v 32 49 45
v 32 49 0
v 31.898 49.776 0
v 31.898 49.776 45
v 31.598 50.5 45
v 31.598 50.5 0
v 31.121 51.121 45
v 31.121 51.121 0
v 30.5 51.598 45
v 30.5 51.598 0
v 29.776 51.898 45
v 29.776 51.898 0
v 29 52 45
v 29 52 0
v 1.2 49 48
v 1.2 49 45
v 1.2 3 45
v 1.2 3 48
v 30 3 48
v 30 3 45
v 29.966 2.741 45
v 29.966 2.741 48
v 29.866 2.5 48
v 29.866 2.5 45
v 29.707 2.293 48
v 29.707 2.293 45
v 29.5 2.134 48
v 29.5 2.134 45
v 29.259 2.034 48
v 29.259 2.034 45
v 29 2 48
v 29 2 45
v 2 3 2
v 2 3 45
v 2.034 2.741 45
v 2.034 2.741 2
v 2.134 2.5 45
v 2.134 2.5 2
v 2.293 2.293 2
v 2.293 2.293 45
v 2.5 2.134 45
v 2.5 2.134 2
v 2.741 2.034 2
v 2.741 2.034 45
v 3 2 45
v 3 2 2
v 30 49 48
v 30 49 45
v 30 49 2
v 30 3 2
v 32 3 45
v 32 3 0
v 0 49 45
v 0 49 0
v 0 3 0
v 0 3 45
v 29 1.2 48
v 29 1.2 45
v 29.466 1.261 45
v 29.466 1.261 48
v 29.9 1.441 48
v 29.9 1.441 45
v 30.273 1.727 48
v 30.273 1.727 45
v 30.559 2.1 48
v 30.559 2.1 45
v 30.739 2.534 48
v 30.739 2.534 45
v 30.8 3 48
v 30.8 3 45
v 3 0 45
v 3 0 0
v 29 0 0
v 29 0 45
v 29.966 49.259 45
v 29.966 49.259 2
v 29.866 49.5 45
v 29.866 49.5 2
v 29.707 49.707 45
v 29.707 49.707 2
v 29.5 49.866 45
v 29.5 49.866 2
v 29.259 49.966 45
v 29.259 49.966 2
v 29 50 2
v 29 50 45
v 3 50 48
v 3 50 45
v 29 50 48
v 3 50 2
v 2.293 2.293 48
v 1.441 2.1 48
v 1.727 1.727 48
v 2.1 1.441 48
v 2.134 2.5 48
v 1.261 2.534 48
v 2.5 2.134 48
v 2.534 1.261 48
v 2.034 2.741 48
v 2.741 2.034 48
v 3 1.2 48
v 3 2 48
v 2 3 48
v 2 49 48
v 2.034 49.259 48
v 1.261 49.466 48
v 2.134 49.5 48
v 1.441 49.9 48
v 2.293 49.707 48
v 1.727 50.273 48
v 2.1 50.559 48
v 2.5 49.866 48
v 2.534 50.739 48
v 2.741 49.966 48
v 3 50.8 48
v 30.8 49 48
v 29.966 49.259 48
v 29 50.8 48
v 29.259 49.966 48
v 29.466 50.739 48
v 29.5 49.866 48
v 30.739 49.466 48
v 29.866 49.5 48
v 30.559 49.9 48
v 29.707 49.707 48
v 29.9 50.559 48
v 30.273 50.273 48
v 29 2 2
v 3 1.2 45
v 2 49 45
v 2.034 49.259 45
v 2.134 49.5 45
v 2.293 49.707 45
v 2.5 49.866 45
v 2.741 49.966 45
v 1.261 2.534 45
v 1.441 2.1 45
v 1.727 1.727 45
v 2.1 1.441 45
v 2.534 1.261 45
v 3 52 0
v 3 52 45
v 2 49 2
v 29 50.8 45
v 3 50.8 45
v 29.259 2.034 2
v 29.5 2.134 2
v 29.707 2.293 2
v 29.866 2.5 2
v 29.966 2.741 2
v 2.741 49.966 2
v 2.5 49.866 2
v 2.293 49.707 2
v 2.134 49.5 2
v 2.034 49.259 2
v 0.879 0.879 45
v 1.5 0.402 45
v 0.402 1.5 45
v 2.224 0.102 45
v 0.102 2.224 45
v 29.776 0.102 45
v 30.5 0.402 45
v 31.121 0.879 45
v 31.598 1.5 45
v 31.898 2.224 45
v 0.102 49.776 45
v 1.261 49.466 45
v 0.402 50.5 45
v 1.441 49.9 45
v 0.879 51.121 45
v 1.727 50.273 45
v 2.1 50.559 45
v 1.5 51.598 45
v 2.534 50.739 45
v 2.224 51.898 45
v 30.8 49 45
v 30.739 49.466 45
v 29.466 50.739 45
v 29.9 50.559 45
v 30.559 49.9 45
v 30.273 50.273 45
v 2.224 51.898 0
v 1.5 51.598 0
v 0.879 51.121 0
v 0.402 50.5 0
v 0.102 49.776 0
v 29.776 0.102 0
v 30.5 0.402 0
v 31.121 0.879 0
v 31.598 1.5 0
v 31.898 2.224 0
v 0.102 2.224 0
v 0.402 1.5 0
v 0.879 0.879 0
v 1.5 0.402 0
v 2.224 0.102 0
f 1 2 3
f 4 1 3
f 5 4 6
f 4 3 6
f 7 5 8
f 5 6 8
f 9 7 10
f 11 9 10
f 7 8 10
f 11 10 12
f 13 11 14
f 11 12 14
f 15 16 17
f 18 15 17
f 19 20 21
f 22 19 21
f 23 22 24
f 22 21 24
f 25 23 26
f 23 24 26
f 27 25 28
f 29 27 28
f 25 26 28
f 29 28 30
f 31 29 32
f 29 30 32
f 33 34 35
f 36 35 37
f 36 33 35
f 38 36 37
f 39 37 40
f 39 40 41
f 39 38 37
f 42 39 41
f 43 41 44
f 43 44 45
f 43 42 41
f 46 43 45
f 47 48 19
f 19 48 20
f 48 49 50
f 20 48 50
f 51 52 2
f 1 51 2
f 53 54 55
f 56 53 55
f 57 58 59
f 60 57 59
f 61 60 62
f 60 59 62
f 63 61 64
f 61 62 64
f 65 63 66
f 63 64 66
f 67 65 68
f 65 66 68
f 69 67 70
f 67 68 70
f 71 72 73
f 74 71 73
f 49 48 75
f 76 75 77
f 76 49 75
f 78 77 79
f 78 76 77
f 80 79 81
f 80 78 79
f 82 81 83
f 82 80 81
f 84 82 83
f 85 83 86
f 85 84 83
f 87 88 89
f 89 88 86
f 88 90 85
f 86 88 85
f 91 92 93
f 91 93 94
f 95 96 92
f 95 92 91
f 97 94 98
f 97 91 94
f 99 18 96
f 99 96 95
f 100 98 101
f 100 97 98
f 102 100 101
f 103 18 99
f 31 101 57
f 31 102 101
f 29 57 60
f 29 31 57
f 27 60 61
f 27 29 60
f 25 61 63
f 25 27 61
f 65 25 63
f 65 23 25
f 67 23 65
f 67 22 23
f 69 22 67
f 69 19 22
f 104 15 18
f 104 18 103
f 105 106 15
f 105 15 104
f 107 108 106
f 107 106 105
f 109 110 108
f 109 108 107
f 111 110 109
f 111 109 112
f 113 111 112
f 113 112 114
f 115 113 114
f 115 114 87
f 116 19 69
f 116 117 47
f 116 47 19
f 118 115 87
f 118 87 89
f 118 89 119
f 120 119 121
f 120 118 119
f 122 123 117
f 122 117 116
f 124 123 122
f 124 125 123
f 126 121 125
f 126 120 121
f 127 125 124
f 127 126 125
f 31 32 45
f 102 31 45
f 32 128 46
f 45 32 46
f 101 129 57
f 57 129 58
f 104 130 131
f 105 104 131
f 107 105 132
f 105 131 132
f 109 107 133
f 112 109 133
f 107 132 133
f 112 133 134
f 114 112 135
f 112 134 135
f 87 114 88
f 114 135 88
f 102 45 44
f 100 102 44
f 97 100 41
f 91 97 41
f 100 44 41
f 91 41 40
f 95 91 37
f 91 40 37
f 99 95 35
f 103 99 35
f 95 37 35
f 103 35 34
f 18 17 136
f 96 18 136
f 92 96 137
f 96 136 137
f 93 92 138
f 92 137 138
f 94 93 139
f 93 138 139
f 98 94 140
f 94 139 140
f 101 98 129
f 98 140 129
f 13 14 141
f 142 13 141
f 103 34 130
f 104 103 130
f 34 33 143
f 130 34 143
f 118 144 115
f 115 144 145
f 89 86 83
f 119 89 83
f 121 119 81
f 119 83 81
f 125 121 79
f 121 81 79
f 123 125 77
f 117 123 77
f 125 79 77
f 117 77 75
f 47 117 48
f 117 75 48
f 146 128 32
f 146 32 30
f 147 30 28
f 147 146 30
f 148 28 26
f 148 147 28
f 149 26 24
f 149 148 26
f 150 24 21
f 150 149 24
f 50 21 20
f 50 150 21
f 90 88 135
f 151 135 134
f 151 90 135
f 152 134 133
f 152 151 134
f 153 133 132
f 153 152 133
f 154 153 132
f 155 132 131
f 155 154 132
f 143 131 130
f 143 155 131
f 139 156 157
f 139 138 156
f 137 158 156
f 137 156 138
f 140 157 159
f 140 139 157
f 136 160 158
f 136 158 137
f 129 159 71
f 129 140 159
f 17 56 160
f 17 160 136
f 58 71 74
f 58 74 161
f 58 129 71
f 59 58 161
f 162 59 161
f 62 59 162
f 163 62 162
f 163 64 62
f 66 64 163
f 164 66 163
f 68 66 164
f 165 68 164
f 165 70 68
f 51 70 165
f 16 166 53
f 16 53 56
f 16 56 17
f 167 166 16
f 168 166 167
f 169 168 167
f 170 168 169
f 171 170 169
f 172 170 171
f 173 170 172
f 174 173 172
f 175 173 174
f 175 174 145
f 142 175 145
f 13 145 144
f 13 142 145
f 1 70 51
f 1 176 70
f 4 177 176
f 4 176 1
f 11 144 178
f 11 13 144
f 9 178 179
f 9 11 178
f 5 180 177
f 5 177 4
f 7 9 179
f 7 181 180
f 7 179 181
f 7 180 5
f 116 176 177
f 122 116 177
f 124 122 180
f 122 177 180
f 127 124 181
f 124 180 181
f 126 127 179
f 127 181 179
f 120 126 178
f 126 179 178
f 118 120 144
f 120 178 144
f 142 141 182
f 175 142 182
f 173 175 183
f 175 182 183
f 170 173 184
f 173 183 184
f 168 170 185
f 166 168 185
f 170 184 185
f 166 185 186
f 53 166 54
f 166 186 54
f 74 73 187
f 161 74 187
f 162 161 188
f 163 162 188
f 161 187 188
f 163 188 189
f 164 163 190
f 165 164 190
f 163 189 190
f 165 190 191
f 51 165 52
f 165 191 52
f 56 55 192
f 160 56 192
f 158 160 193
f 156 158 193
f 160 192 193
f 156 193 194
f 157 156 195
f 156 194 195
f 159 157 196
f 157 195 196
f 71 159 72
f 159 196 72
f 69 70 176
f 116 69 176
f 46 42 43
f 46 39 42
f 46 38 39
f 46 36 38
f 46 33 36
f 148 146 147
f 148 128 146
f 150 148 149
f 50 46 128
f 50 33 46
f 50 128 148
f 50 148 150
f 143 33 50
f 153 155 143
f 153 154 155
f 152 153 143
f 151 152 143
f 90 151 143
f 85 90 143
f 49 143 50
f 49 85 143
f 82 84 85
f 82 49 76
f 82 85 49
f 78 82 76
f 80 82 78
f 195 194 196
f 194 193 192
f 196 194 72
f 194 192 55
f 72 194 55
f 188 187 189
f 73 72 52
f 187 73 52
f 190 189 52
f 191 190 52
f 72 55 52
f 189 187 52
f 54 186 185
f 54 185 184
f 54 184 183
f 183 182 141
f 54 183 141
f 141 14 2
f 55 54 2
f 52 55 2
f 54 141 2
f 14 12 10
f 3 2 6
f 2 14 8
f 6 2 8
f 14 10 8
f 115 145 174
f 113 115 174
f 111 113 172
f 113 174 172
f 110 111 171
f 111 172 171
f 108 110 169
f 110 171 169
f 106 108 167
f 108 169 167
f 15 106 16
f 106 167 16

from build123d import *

# Parameters (mm, degrees)
F1_DEPTH = 45
F2_T     = -2
F4_DEPTH = 3


with BuildPart() as f1:
    # F0 (on Top) → F1 (new body)
    with BuildSketch(Plane.XY):
        with BuildLine():
            ThreePointArc((0, 3), (0.87868, 0.87868), (3, 0))
            Line((3, 0), (29, 0))
            ThreePointArc((29, 0), (31.12132, 0.87868), (32, 3))
            Line((32, 3), (32, 49))
            ThreePointArc((32, 49), (31.12132, 51.12132), (29, 52))
            Line((29, 52), (3, 52))
            ThreePointArc((3, 52), (0.87868, 51.12132), (0, 49))
            Line((0, 49), (0, 3))
        make_face()
    extrude(amount=F1_DEPTH)

    # F2
    f2_openings = [f1.faces().sort_by_distance(p)[0] for p in [
        (16, 26, 45),
    ]]
    offset(amount=F2_T, openings=f2_openings)

    # F3 (on face) → F4 (join)
    with BuildSketch(Plane.XY.offset(45)):
        with BuildLine():
            Line((29, 50.8), (3, 50.8))
            ThreePointArc((3, 50.8), (1.727208, 50.272792), (1.2, 49))
            Line((1.2, 49), (1.2, 3))
            ThreePointArc((1.2, 3), (1.727208, 1.727208), (3, 1.2))
            Line((3, 1.2), (29, 1.2))
            ThreePointArc((29, 1.2), (30.272792, 1.727208), (30.8, 3))
            Line((30.8, 3), (30.8, 49))
            ThreePointArc((30.8, 49), (30.272792, 50.272792), (29, 50.8))
        make_face()
        with BuildLine():
            Line((29, 2), (3, 2))
            ThreePointArc((3, 2), (2.292893, 2.292893), (2, 3))
            Line((2, 3), (2, 49))
            ThreePointArc((2, 49), (2.292893, 49.707107), (3, 50))
            Line((3, 50), (29, 50))
            ThreePointArc((29, 50), (29.707107, 49.707107), (30, 49))
            Line((30, 49), (30, 3))
            ThreePointArc((30, 3), (29.707107, 2.292893), (29, 2))
        make_face(mode=Mode.SUBTRACT)
    extrude(amount=F4_DEPTH)


solid = f1.part
